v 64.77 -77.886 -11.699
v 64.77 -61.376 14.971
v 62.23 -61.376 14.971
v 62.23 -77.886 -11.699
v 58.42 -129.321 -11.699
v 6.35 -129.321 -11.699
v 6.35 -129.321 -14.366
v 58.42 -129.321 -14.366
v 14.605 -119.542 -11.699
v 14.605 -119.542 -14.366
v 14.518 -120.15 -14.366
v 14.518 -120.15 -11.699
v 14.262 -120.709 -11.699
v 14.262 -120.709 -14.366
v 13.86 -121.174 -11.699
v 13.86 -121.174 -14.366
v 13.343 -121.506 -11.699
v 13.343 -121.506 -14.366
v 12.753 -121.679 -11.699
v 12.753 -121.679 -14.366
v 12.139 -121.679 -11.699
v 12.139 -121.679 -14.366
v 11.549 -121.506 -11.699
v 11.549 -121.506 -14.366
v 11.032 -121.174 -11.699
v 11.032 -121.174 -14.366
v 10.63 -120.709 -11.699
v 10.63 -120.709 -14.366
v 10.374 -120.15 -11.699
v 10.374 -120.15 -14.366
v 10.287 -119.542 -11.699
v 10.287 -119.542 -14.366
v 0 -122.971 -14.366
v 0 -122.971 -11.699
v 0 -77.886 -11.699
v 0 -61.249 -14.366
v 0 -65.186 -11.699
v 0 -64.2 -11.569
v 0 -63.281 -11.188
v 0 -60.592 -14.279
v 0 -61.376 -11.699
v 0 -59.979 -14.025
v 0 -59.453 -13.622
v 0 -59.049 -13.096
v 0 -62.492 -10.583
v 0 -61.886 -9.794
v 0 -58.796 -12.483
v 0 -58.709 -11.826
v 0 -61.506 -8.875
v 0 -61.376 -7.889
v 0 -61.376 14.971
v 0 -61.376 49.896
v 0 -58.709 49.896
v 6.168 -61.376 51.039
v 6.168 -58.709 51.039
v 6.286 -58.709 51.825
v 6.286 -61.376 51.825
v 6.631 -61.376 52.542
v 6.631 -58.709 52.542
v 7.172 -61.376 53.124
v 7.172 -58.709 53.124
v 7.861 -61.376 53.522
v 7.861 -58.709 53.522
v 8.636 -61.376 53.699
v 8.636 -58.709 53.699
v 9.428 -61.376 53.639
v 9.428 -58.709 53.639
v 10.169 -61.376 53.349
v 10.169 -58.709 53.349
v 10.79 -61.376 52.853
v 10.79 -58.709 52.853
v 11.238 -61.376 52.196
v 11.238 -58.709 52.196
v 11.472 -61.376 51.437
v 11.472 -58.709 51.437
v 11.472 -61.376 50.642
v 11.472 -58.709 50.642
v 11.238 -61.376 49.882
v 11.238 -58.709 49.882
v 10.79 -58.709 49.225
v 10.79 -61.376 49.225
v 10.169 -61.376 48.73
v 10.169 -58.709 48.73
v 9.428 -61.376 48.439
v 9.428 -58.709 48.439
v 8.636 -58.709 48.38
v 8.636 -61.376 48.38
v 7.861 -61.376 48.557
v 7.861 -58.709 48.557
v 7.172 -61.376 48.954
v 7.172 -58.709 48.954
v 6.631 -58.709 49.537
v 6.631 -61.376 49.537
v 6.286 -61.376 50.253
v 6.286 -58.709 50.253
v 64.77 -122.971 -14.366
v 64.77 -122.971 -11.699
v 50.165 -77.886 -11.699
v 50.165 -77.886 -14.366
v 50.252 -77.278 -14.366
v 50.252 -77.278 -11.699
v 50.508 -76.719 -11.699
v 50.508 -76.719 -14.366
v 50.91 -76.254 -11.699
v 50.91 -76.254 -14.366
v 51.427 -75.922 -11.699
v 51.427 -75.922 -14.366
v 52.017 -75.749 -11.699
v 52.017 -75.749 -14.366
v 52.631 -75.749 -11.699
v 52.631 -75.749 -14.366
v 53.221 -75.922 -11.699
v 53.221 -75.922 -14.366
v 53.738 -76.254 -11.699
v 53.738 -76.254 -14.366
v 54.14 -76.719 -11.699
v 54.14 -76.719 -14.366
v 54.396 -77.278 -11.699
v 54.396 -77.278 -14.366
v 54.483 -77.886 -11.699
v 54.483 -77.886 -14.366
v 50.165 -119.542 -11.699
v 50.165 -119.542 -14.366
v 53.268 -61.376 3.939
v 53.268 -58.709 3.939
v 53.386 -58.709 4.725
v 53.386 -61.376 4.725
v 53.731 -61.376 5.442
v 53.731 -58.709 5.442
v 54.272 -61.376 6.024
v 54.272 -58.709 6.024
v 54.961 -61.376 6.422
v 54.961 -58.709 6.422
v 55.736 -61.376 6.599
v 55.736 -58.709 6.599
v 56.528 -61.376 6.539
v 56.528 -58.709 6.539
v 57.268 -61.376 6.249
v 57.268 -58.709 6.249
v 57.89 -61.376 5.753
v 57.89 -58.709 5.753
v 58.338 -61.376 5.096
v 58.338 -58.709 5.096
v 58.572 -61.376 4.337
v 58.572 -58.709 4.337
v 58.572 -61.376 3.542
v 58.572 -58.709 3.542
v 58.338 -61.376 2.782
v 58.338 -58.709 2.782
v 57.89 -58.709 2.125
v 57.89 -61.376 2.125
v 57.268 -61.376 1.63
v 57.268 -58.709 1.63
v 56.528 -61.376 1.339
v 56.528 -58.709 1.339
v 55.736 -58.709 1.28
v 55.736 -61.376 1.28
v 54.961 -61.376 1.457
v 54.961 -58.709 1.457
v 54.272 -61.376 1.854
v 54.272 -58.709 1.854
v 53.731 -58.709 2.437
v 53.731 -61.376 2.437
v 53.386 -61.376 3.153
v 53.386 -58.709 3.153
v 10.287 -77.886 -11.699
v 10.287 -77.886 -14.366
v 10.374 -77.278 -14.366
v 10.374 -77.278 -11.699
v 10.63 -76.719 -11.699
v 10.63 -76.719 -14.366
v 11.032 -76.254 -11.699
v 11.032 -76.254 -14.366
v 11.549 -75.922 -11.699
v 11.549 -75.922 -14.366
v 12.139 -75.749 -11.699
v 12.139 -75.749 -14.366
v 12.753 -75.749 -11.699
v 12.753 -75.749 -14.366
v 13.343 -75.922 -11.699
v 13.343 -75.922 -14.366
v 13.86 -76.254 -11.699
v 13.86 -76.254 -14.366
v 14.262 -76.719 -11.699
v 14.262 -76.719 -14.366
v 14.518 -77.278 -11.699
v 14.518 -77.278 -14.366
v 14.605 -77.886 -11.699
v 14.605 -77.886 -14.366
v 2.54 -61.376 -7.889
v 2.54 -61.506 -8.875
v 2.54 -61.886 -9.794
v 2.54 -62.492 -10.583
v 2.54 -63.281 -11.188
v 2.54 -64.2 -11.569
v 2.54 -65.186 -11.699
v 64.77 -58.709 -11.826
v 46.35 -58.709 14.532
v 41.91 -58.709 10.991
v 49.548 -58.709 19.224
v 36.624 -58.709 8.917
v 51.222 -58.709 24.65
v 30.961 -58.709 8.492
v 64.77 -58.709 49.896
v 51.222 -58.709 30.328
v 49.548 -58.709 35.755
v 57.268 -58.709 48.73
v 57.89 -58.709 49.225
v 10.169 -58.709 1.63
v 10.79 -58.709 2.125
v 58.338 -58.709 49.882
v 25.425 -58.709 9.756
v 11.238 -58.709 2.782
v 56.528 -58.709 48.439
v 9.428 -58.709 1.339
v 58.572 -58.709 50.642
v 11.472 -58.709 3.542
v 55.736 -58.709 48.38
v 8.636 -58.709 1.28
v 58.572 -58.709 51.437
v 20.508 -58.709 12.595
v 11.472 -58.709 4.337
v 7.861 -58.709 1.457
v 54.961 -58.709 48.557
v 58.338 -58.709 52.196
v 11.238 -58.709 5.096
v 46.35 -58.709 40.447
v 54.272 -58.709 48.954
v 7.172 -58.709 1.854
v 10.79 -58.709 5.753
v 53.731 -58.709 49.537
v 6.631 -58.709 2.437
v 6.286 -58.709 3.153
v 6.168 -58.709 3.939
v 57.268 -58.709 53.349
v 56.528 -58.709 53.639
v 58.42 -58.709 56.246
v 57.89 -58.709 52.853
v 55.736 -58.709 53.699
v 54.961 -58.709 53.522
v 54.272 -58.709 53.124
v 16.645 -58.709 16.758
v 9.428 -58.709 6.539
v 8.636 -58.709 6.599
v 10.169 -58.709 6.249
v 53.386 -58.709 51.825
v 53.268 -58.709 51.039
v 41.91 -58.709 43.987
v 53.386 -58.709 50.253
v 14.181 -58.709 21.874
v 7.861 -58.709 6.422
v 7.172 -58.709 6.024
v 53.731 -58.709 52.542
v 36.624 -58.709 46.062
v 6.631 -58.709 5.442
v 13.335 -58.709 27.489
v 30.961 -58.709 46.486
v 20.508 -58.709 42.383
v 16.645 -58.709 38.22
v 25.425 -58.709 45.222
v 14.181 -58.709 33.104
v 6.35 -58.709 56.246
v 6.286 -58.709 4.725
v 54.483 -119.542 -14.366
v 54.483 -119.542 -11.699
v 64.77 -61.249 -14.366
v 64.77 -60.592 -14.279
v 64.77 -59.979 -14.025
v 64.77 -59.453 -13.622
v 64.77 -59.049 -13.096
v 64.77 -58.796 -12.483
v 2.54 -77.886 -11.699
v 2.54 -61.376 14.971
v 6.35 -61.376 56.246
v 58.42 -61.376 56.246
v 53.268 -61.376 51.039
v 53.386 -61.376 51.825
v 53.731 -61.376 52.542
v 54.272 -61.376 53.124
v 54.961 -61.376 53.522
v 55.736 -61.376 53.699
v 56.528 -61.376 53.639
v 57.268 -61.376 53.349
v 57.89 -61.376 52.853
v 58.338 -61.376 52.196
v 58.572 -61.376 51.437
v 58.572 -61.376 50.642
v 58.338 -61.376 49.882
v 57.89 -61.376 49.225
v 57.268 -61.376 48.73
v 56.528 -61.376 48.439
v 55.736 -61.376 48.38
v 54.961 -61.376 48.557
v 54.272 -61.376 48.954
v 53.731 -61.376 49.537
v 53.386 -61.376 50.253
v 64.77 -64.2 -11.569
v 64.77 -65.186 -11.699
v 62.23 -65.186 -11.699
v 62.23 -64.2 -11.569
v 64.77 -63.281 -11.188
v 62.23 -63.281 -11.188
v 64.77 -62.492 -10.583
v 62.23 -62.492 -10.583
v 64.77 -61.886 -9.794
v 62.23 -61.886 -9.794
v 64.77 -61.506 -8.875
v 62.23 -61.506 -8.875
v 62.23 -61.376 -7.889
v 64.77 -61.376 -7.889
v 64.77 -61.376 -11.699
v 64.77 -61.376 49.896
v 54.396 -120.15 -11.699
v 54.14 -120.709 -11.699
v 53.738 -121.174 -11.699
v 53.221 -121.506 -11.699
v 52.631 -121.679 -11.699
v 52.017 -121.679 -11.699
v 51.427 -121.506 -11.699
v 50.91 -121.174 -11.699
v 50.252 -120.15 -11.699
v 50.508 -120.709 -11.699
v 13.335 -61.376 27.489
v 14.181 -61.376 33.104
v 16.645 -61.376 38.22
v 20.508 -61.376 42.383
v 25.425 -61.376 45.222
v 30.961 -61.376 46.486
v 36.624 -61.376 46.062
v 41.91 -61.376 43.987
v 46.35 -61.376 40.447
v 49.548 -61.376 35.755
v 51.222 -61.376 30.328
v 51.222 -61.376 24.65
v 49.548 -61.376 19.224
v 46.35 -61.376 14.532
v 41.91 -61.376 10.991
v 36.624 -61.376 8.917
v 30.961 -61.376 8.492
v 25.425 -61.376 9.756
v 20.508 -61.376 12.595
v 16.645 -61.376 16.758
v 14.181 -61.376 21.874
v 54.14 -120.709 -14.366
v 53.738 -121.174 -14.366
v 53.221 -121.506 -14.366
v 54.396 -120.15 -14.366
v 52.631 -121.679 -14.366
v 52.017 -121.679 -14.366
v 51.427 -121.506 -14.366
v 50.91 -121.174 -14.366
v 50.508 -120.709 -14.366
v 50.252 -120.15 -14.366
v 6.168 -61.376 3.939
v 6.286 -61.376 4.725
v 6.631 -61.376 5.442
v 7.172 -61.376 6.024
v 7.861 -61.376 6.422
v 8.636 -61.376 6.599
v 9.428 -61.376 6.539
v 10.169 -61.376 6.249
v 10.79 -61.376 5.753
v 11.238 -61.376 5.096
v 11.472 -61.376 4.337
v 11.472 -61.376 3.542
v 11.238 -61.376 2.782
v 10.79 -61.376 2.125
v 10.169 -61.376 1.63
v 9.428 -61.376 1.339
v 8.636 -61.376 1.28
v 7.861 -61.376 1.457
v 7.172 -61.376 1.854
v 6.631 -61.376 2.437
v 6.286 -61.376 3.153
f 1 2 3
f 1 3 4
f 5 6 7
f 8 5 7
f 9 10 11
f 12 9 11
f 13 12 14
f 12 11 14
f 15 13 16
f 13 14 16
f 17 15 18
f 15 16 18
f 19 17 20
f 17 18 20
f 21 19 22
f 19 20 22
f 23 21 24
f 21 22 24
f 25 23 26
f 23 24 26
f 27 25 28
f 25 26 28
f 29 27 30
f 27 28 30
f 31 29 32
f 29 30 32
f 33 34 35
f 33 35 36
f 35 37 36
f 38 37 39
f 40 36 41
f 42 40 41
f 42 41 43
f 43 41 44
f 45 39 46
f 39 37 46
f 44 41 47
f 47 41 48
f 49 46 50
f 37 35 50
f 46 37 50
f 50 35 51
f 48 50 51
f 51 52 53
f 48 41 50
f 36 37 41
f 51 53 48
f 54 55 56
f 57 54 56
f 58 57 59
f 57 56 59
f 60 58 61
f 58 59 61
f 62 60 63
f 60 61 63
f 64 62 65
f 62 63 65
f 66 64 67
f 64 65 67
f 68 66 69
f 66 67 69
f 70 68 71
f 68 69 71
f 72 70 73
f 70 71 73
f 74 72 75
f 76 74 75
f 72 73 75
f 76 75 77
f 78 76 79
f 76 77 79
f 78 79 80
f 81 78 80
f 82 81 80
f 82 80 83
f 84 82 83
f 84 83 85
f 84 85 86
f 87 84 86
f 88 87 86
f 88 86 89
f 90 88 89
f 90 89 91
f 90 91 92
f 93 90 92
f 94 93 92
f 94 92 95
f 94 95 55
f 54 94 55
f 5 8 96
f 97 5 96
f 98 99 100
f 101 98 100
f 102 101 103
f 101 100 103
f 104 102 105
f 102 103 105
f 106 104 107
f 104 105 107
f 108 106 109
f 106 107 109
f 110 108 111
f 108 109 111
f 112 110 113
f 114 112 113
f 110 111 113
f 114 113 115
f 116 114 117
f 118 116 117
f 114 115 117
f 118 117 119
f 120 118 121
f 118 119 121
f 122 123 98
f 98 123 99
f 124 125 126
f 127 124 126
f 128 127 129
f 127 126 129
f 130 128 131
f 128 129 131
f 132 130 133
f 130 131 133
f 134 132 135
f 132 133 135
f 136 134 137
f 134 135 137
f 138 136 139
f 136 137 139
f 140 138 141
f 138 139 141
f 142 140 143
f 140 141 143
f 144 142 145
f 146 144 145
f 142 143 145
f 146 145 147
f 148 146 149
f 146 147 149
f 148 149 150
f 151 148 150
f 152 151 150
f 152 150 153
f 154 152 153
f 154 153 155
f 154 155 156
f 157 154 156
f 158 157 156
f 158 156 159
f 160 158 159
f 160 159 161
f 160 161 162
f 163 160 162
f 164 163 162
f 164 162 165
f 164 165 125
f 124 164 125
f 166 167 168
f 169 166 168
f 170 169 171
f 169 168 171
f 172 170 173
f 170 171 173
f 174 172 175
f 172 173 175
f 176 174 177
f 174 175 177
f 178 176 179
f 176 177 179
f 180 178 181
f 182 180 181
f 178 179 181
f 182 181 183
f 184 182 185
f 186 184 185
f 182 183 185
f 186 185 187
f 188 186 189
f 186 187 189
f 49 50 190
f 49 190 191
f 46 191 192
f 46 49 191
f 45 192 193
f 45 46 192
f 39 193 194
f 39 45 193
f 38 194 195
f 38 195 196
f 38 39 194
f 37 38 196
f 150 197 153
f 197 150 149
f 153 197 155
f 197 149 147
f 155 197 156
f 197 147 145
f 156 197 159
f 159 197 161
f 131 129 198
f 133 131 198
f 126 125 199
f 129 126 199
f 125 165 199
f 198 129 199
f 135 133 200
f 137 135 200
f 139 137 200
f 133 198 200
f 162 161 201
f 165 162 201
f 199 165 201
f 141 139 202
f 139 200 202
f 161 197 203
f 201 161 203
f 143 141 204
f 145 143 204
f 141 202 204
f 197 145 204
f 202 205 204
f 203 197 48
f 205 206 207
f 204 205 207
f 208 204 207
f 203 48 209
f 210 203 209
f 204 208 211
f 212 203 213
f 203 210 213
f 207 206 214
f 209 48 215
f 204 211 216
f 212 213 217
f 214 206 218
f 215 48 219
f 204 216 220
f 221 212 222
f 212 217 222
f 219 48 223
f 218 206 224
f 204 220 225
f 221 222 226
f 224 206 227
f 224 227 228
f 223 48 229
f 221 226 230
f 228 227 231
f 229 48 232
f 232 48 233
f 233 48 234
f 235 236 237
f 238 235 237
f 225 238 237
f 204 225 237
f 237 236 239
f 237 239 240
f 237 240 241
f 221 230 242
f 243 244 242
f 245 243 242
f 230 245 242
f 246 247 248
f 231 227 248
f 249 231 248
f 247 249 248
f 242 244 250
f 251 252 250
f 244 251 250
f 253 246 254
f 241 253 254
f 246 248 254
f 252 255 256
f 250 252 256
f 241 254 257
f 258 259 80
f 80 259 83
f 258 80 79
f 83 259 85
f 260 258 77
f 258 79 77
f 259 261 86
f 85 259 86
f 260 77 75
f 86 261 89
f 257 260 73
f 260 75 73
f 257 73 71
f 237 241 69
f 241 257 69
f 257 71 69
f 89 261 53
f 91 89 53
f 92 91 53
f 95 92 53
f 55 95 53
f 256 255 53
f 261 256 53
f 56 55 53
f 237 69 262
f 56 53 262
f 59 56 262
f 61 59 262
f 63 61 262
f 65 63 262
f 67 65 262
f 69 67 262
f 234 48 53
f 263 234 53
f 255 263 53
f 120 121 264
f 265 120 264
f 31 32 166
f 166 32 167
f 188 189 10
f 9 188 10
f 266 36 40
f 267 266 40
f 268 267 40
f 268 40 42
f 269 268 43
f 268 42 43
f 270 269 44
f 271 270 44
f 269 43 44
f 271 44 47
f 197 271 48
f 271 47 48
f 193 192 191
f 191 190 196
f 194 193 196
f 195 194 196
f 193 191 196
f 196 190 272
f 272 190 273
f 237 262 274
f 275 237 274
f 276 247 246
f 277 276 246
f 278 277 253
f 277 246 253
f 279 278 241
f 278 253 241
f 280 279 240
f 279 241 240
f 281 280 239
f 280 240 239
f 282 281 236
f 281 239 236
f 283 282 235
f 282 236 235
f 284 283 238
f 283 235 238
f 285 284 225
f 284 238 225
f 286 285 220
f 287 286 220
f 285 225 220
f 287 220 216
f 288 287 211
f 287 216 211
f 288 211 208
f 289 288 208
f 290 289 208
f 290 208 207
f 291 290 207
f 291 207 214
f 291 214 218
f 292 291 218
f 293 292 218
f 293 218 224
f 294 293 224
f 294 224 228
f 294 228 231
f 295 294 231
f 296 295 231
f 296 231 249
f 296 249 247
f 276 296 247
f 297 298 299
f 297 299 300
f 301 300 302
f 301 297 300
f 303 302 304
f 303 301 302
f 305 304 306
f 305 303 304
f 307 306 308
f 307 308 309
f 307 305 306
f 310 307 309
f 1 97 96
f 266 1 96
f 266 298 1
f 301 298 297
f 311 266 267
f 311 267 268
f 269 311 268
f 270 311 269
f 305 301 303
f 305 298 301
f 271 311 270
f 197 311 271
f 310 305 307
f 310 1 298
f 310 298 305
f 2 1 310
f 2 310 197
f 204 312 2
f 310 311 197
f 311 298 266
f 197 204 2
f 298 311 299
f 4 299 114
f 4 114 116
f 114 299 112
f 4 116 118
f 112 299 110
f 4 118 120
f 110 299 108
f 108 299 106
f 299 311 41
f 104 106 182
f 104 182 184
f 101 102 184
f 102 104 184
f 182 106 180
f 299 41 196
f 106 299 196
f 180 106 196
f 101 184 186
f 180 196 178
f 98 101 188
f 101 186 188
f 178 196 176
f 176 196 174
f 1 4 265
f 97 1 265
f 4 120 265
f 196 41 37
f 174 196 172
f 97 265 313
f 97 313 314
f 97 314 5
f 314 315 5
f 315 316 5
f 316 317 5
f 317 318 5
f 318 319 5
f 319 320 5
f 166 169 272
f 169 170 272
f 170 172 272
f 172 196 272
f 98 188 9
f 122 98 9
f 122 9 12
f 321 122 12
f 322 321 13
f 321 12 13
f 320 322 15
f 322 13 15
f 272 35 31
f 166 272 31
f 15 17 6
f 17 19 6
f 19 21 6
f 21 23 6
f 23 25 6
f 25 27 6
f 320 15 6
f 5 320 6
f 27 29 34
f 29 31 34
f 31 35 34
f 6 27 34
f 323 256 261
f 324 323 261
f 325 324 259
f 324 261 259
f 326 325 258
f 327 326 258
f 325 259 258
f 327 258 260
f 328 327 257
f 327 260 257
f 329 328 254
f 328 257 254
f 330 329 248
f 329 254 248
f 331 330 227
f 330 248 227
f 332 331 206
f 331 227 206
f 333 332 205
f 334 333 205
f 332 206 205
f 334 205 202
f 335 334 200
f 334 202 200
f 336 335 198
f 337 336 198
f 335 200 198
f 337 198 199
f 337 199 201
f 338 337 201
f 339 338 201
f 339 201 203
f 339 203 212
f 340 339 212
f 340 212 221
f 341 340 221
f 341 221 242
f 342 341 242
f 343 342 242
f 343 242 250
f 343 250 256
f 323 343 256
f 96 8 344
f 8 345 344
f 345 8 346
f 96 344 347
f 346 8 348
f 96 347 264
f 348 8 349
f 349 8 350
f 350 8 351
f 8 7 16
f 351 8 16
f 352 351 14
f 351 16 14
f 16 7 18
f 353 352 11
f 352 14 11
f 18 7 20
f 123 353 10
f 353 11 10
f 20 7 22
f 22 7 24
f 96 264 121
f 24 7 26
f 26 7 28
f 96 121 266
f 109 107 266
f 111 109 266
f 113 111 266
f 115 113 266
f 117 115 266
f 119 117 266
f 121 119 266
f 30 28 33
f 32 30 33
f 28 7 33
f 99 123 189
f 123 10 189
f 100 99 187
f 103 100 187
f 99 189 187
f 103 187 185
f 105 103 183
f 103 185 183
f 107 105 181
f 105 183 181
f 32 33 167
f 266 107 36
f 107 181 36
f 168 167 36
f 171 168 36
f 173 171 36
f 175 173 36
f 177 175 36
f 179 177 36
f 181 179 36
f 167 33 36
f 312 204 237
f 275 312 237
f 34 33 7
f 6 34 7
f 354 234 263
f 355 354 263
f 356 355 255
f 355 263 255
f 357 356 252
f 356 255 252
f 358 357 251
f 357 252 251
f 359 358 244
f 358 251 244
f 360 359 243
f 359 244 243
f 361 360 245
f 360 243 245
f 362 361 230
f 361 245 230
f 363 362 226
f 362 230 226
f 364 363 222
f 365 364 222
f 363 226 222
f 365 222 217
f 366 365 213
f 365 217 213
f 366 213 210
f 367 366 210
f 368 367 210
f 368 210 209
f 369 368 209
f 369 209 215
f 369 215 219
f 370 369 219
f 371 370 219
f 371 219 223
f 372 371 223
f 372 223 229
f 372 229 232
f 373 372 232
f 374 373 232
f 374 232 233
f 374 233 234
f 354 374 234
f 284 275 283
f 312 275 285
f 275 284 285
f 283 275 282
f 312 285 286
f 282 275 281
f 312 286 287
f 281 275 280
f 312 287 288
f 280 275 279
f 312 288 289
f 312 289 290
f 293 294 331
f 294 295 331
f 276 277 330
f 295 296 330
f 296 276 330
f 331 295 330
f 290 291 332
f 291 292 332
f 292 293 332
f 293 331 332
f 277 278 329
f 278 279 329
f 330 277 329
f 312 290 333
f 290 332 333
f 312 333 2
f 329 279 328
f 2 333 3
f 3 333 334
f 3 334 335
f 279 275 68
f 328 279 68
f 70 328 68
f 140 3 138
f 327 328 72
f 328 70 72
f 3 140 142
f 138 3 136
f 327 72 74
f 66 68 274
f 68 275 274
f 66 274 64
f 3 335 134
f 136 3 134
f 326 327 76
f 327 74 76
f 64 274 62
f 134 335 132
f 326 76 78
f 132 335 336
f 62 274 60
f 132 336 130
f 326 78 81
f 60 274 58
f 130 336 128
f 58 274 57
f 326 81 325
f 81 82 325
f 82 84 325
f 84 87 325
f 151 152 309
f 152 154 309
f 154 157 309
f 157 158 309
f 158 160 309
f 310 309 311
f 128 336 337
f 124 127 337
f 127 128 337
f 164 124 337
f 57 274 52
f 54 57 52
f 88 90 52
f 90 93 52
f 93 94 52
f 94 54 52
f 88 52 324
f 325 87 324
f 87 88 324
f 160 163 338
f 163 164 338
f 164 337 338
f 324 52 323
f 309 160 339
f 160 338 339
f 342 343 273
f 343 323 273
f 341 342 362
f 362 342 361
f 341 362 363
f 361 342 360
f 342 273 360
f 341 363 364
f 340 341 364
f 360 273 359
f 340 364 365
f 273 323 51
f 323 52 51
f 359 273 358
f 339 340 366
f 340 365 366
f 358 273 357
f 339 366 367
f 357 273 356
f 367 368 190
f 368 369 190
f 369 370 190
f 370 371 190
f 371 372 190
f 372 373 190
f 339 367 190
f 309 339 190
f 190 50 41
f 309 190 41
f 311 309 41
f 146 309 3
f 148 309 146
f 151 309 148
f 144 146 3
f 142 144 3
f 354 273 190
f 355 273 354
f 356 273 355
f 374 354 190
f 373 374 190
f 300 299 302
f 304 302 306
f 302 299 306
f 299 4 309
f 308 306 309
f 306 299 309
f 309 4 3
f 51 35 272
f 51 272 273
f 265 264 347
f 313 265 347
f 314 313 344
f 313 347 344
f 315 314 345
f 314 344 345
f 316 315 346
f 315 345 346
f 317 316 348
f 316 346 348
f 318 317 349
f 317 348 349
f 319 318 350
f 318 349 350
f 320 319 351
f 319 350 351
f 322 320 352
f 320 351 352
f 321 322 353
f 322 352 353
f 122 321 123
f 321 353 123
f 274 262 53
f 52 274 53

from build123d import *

# Parameters (mm, degrees)
F1_DEPTH = 64.77
F4_DEPTH = 2.54
F5_DEPTH = 2.54
F6_R     = 2.667
F6_R_2   = 19.05
F7_DEPTH = 70.613
F9_DEPTH = 70.613


with BuildPart() as f1:
    # F0 (on Right) → F1 (new body)
    with BuildSketch(Plane.YZ):
        with BuildLine():
            Line((-58.708991, 56.24623), (-61.375991, 56.24623))
            Line((-61.375991, 56.24623), (-61.375991, -11.69877))
            Line((-61.375991, -11.69877), (-129.320991, -11.69877))
            Line((-129.320991, -11.69877), (-129.320991, -14.36577))
            Line((-129.320991, -14.36577), (-61.248991, -14.36577))
            ThreePointArc((-61.248991, -14.36577), (-59.45294, -13.621821), (-58.708991, -11.82577))
            Line((-58.708991, -11.82577), (-58.708991, 56.24623))
        make_face()
    extrude(amount=F1_DEPTH)

    # F3 (on face) → F4 (join)
    with BuildSketch(Plane(origin=(0, 0, 0), x_dir=(0, -1, 0), z_dir=(-1, 0, 0))):
        with BuildLine():
            Line((77.885991, -11.69877), (61.375991, 14.97123))
            Line((61.375991, 14.97123), (61.375991, -7.88877))
            ThreePointArc((61.375991, -7.88877), (62.491914, -10.582847), (65.185991, -11.69877))
            Line((65.185991, -11.69877), (77.885991, -11.69877))
        make_face()
    extrude(amount=-F4_DEPTH)

    # F2 (on face) → F5 (join)
    with BuildSketch(Plane.YZ.offset(64.77)):
        with BuildLine():
            Line((-61.375991, -7.88877), (-61.375991, 14.97123))
            Line((-61.375991, 14.97123), (-77.885991, -11.69877))
            Line((-77.885991, -11.69877), (-65.185991, -11.69877))
            ThreePointArc((-65.185991, -11.69877), (-62.491914, -10.582847), (-61.375991, -7.88877))
        make_face()
    extrude(amount=-F5_DEPTH)

    # F6 (on face) → F7 (cut, through all)
    with BuildSketch(Plane(origin=(0, -58.708991, 0), x_dir=(-1, 0, 0), z_dir=(0, 1, 0))):
        Polygon((-64.77, 56.24623), (-64.77, 49.89623), (-58.42, 56.24623), align=None)
        with Locations((-55.935, 51.03923)):
            Circle(F6_R)
        with Locations((-8.835, 51.03923)):
            Circle(F6_R)
        Polygon((0, 56.24623), (-6.35, 56.24623), (0, 49.89623), align=None)
        with Locations((-32.385, 27.48923)):
            Circle(F6_R_2)
        with Locations((-55.935, 3.93923)):
            Circle(F6_R)
        with Locations((-8.835, 3.93923)):
            Circle(F6_R)
    extrude(amount=-F7_DEPTH, mode=Mode.SUBTRACT)

    # F8 (on face) → F9 (cut, through all)
    with BuildSketch(Plane(origin=(0, 0, -14.36577), x_dir=(1, 0, 0), z_dir=(0, 0, -1))):
        Polygon((0, 129.320991), (0, 122.970991), (6.35, 129.320991), align=None)
        with BuildLine():
            Line((14.605, 77.885991), (14.605, 119.541991))
            ThreePointArc((14.605, 119.541991), (12.446, 121.700991), (10.287, 119.541991))
            Line((10.287, 119.541991), (10.287, 77.885991))
            ThreePointArc((10.287, 77.885991), (12.446, 75.726991), (14.605, 77.885991))
        make_face()
        with BuildLine():
            Line((54.483, 77.885991), (54.483, 119.541991))
            ThreePointArc((54.483, 119.541991), (52.324, 121.700991), (50.165, 119.541991))
            Line((50.165, 119.541991), (50.165, 77.885991))
            ThreePointArc((50.165, 77.885991), (52.324, 75.726991), (54.483, 77.885991))
        make_face()
        Polygon((64.77, 129.320991), (58.42, 129.320991), (64.77, 122.970991), align=None)
    extrude(amount=-F9_DEPTH, mode=Mode.SUBTRACT)


solid = f1.part
